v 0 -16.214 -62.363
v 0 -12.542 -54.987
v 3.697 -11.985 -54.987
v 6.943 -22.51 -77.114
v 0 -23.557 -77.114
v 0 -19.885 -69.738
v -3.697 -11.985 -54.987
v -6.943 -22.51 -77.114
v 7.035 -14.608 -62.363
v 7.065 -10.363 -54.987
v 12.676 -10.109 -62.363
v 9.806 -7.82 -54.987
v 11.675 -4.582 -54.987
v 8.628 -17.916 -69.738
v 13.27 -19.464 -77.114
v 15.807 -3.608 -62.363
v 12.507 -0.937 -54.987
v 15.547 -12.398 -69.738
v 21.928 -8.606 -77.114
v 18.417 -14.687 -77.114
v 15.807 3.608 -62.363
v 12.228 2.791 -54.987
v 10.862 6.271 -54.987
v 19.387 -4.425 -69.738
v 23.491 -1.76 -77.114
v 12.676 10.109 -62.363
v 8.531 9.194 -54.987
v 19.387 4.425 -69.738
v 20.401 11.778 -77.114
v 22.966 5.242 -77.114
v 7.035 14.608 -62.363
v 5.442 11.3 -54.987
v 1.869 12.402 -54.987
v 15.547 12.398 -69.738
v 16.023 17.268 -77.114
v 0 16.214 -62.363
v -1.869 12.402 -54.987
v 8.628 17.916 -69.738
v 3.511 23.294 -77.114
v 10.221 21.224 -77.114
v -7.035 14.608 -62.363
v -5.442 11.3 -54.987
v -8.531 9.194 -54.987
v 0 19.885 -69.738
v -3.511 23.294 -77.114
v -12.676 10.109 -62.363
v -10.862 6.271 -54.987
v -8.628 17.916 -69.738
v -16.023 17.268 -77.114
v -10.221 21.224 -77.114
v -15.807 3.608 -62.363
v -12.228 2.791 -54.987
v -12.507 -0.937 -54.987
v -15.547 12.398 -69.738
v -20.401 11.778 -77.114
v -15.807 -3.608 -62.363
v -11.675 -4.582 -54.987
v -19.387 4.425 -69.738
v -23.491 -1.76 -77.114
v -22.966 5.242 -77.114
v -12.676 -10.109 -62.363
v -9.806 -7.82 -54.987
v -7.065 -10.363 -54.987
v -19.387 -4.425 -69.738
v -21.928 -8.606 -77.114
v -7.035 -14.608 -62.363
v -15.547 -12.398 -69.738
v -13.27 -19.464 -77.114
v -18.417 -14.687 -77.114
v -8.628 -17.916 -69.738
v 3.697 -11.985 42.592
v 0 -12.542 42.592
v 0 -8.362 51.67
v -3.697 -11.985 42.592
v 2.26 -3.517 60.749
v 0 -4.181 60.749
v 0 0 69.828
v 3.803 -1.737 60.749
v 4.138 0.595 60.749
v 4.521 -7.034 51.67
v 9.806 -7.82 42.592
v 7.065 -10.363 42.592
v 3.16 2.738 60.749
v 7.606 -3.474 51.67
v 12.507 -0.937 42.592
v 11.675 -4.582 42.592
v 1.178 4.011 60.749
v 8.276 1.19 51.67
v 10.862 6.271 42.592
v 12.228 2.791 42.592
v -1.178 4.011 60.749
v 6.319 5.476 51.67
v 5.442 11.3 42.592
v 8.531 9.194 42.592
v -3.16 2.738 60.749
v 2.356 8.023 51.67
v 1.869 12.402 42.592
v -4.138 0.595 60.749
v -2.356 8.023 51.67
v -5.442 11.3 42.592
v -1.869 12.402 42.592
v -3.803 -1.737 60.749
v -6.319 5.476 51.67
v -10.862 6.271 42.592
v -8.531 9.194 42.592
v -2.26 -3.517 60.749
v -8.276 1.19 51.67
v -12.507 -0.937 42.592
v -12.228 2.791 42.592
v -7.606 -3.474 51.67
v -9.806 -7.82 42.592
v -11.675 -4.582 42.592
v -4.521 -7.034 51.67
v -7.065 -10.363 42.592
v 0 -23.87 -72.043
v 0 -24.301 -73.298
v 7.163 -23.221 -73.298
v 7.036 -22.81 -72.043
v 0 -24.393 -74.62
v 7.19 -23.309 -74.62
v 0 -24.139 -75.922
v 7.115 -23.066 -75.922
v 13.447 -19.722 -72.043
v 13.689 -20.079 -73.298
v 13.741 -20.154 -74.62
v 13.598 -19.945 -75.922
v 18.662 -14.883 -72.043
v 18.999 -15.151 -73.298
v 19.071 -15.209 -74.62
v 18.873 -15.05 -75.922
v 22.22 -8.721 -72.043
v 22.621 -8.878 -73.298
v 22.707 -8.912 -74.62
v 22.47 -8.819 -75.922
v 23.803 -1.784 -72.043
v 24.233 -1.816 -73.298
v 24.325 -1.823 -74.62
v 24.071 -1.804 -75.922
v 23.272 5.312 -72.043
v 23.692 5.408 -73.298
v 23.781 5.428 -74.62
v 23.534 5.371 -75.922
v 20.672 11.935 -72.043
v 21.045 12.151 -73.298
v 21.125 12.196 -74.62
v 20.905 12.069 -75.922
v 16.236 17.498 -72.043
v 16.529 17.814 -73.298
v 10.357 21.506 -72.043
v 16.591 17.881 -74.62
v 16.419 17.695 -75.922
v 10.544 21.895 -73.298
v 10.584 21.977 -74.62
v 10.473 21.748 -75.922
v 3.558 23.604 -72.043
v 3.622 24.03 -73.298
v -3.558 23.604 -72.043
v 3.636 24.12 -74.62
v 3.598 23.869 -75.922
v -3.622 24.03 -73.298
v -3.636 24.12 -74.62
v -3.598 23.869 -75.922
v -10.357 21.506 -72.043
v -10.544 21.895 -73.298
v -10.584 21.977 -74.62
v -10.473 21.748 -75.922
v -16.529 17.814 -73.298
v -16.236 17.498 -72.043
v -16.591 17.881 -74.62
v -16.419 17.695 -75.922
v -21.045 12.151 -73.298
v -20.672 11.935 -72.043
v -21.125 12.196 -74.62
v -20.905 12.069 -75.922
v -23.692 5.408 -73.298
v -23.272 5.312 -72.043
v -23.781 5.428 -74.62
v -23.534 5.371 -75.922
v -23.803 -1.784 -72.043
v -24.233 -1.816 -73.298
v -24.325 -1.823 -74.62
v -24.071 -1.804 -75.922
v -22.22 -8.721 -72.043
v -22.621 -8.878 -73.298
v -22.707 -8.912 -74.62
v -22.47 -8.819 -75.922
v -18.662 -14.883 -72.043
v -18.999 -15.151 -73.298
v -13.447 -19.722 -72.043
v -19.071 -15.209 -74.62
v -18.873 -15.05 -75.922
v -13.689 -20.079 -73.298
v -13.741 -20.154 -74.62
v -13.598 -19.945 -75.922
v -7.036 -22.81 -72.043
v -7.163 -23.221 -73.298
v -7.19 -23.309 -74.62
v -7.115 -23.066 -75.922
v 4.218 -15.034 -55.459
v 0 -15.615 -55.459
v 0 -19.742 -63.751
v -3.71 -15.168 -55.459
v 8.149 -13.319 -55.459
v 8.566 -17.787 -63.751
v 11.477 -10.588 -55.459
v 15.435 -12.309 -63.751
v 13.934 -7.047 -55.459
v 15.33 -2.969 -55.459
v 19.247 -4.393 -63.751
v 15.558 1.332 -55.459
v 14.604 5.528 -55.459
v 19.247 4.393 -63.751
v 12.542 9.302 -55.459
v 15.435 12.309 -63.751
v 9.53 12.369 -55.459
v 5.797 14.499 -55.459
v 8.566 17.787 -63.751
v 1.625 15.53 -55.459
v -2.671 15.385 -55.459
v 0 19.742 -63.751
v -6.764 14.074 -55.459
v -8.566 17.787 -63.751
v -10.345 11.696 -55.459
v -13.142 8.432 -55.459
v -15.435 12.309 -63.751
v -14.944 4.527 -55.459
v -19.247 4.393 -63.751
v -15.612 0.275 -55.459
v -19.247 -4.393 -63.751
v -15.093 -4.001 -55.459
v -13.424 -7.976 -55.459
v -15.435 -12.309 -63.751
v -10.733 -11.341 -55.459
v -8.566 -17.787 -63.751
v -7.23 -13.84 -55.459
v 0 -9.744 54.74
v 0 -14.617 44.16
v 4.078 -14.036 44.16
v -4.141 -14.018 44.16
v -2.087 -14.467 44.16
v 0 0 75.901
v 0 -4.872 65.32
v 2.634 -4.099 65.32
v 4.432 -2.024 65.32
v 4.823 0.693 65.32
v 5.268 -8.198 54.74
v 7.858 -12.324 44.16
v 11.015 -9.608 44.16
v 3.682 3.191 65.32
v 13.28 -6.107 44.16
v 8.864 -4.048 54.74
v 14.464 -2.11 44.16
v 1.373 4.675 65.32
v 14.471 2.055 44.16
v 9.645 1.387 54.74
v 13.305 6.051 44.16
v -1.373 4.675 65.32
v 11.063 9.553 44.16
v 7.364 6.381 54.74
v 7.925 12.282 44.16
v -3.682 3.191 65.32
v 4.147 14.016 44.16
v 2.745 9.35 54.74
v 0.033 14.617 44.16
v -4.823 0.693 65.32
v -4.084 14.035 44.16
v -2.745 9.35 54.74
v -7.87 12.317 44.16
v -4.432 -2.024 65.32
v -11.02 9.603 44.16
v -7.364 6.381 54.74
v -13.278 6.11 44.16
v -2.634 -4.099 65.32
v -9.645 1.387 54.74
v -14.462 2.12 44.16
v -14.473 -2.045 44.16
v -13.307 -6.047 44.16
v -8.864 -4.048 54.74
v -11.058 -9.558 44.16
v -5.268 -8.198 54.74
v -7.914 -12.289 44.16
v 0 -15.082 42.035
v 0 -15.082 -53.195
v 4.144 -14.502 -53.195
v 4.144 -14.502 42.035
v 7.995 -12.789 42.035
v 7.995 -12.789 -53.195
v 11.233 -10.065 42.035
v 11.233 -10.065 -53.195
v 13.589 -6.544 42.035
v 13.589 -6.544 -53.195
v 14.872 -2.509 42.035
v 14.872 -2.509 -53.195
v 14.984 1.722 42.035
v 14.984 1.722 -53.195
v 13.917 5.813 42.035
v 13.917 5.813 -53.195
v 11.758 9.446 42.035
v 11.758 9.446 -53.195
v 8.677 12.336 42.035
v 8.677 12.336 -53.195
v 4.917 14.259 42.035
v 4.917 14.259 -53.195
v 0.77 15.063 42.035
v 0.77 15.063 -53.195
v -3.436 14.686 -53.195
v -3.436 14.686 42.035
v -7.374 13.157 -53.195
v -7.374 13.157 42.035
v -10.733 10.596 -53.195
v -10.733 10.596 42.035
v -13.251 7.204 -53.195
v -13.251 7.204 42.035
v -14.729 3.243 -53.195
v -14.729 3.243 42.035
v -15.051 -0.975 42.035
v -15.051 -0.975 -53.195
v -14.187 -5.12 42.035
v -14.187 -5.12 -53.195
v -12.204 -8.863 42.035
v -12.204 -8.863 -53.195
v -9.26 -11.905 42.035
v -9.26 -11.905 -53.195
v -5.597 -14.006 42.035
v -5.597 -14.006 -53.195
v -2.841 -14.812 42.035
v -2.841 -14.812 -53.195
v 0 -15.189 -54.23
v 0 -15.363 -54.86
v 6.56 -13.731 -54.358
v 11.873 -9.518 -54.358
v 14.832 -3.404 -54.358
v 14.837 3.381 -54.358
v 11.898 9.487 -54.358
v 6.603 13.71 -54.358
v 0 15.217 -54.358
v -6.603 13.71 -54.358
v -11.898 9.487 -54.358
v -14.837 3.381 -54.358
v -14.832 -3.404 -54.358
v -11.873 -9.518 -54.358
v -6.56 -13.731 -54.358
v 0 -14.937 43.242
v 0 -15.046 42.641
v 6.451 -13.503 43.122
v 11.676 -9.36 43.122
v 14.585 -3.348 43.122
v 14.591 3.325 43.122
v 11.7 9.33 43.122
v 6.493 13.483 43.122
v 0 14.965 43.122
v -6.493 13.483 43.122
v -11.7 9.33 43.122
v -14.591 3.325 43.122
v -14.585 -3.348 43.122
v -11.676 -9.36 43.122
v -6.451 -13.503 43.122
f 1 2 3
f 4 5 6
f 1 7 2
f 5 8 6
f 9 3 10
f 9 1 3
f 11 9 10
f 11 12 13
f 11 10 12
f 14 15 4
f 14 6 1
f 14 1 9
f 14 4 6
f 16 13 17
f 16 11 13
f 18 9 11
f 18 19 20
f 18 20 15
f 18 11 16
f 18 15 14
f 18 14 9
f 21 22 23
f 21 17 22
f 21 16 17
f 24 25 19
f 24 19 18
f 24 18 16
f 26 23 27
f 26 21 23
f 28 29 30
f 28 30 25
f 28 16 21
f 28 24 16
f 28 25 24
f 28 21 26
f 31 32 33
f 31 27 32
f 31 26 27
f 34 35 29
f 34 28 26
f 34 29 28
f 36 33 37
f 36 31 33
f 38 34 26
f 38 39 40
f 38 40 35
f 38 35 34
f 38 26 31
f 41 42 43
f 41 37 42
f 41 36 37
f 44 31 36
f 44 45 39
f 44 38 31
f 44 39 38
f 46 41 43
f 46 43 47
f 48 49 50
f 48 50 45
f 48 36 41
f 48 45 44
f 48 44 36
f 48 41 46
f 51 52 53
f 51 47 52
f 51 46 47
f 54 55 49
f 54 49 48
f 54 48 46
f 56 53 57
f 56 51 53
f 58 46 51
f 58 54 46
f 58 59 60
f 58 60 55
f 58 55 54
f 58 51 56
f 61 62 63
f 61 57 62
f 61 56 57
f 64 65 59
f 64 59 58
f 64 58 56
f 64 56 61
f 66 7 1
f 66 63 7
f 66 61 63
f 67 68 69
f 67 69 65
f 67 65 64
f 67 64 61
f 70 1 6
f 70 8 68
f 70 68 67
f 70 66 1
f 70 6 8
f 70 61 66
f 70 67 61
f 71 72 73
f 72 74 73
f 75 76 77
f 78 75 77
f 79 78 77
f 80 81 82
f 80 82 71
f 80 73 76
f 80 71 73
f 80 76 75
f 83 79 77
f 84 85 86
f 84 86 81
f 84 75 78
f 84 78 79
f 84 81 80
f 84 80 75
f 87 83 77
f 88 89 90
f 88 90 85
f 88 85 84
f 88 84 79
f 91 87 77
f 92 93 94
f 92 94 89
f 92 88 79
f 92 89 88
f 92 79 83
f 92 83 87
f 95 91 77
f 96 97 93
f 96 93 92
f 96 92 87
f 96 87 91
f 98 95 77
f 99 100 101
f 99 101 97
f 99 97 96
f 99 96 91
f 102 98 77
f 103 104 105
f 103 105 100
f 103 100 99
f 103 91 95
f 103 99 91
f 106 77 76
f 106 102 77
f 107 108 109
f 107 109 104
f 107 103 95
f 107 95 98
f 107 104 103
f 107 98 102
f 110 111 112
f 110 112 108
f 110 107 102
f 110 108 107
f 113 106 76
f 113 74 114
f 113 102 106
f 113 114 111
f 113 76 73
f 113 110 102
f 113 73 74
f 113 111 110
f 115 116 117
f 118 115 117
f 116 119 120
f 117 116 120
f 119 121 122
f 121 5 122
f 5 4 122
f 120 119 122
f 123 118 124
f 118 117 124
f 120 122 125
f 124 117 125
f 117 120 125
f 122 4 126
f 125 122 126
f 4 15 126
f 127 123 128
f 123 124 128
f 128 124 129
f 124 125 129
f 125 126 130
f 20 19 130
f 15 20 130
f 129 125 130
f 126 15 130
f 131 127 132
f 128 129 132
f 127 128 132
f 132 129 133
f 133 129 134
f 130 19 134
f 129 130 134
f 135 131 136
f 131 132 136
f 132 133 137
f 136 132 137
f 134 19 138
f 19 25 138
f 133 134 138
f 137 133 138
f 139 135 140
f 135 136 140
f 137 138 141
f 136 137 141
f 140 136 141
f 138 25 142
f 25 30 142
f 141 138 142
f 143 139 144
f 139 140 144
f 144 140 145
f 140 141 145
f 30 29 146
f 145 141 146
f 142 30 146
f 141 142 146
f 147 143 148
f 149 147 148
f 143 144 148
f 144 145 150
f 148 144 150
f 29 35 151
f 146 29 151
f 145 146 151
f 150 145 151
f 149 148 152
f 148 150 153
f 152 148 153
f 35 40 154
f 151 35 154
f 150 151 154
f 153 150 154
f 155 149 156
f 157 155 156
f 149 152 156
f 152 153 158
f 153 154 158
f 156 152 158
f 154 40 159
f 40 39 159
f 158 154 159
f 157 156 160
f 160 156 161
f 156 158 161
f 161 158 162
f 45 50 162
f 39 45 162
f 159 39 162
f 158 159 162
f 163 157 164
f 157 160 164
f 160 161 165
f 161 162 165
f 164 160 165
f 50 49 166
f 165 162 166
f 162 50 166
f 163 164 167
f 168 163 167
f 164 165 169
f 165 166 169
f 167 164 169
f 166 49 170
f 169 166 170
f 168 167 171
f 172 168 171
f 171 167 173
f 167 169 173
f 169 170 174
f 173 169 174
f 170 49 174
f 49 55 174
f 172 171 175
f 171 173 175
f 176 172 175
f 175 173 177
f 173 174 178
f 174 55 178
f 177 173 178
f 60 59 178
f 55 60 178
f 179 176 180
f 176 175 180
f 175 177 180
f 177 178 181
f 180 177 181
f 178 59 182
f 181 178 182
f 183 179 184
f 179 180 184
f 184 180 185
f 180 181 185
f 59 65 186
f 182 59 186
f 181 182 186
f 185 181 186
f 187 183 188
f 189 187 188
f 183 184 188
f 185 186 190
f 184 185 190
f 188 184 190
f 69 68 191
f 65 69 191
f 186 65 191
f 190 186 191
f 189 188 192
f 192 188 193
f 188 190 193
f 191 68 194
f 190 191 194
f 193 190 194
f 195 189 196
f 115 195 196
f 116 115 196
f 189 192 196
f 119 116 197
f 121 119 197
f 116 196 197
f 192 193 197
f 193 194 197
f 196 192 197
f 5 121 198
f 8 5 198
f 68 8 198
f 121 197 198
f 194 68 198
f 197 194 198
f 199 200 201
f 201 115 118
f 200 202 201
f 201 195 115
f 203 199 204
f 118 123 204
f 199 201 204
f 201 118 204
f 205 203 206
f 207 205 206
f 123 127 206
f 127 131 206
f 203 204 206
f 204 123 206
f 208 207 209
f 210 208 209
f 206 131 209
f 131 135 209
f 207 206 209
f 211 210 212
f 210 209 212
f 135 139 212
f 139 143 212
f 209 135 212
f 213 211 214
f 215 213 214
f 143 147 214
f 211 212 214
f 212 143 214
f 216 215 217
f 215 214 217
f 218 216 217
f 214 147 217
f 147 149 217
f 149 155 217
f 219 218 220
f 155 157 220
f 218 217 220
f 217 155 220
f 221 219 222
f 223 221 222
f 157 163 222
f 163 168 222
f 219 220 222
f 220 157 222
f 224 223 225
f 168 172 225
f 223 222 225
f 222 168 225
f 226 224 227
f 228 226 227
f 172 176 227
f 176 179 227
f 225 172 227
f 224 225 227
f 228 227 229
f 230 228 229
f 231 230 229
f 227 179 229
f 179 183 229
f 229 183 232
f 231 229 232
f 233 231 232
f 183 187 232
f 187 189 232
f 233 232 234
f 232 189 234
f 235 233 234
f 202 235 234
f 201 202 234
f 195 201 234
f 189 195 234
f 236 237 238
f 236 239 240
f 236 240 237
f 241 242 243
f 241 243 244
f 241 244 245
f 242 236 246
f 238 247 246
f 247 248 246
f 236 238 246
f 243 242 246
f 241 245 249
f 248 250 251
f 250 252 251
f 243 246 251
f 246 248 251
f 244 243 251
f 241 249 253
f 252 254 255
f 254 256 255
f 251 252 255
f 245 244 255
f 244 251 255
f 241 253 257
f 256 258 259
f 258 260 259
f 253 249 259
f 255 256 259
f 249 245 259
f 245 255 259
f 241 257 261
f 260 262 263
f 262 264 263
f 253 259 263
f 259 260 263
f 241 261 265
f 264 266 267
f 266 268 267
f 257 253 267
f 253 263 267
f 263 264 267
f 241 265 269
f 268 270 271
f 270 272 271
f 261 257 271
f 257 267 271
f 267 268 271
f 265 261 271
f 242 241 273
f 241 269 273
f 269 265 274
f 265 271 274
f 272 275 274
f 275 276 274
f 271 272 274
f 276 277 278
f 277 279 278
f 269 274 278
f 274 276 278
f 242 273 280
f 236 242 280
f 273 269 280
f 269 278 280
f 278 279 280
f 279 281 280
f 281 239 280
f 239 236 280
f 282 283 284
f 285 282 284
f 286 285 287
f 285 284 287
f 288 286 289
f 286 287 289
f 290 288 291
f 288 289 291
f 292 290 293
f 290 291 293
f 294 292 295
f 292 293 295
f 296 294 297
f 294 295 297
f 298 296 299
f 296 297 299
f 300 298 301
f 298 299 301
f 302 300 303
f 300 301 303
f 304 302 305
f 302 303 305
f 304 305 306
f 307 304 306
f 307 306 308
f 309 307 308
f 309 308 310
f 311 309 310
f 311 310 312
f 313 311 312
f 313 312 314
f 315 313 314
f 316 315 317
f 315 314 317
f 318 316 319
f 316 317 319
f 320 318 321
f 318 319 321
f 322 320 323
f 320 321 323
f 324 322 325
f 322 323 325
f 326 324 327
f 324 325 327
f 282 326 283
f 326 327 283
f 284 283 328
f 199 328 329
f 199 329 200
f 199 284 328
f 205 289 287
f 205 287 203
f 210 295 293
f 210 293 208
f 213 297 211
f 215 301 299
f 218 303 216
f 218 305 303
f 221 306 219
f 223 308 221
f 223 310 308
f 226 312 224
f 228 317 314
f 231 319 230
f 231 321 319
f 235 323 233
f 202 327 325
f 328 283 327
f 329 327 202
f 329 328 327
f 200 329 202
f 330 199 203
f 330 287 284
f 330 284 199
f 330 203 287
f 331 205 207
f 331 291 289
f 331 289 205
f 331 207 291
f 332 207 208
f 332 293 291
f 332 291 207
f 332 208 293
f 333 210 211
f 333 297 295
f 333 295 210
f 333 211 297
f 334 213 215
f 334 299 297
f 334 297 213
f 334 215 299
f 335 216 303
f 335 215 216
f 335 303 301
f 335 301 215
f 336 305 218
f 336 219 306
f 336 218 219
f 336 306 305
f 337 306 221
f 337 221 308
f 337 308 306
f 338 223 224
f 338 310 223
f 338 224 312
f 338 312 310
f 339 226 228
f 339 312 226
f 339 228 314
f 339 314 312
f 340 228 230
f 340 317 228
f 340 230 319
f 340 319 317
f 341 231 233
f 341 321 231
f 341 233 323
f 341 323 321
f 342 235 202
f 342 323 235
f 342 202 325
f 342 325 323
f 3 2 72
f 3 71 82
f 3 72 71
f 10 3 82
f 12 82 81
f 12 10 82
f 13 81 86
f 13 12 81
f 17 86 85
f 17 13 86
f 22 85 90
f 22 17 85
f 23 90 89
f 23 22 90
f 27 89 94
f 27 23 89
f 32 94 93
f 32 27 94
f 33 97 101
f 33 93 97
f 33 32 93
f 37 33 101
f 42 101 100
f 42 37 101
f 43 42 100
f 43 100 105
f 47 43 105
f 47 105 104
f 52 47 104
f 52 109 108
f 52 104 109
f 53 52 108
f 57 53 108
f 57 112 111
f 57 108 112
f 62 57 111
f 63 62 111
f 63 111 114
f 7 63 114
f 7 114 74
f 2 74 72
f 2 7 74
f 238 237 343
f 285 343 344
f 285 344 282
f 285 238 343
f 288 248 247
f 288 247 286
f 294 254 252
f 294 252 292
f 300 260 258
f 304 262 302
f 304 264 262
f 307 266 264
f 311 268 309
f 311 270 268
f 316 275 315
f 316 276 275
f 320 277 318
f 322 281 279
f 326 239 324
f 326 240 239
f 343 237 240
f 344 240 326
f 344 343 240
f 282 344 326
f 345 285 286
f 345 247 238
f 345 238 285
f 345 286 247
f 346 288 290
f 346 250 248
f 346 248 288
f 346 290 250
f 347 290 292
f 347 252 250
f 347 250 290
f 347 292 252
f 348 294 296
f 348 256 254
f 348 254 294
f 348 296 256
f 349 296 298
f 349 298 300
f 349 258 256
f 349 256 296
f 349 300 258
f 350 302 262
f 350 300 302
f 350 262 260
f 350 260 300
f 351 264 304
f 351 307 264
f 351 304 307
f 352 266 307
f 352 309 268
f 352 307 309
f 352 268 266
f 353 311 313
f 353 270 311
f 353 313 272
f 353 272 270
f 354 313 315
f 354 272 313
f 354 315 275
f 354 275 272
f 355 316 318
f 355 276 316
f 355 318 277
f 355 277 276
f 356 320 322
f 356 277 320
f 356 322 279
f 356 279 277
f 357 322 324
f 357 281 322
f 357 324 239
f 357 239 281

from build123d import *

# Parameters (mm, degrees)
F3_T = -2.54
F4_R = 5.08


# Not quite as in the source:
# - a fillet or chamfer that OpenCascade refuses, or shapes differently, is made with other operations: its cross-section is extruded or revolved along the edge and cut away or added


with BuildPart() as f2:
    # F0 (on Right) → F2 (revolve)
    with BuildSketch(Plane.YZ):
        Polygon((0, -77.1136805415), (0, 0), (0, 75.9008899331), (-15.0823583826, 43.1482791901), (-15.0823583826, -54.3898443918), (-26.3941269368, -77.1136805415), align=None)
    revolve(axis=Axis((0, 0, 37.9504449666), (0, 0, 1)))

    # F3
    f3_openings = [f2.faces().sort_by_distance(p)[0] for p in [
        (0, 0, -77.113681),
    ]]
    offset(amount=F3_T, openings=f3_openings, kind=Kind.INTERSECTION)

    # F4
    f4_edges = [f2.edges().sort_by_distance(p)[0] for p in [
        (0, 15.082358, 43.148279),
        (0, 15.082358, -54.389844),
        (0, -15.082358, -5.620783),
    ]]
    fillet(f4_edges, radius=F4_R)

    # F5: fillet of radius 5.08 on 3 edges, made by hand

    # F5_s1 → F5_t2 (revolve, cut)
    with BuildSketch(Plane.YZ):
        with BuildLine():
            ThreePointArc((-23.8701527835, -72.0433526939), (-24.3927830464, -74.6204948412), (-23.5568230573, -77.1136805415))
            Line((-23.5568230573, -77.1136805415), (-26.3941269368, -77.1136805415))
            Line((-26.3941269368, -77.1136805415), (-23.8701527835, -72.0433526939))
        make_face()
    revolve(axis=Axis((0, 0, -77.1136805415), (0, 0, 1)), mode=Mode.SUBTRACT)


solid = f2.part
